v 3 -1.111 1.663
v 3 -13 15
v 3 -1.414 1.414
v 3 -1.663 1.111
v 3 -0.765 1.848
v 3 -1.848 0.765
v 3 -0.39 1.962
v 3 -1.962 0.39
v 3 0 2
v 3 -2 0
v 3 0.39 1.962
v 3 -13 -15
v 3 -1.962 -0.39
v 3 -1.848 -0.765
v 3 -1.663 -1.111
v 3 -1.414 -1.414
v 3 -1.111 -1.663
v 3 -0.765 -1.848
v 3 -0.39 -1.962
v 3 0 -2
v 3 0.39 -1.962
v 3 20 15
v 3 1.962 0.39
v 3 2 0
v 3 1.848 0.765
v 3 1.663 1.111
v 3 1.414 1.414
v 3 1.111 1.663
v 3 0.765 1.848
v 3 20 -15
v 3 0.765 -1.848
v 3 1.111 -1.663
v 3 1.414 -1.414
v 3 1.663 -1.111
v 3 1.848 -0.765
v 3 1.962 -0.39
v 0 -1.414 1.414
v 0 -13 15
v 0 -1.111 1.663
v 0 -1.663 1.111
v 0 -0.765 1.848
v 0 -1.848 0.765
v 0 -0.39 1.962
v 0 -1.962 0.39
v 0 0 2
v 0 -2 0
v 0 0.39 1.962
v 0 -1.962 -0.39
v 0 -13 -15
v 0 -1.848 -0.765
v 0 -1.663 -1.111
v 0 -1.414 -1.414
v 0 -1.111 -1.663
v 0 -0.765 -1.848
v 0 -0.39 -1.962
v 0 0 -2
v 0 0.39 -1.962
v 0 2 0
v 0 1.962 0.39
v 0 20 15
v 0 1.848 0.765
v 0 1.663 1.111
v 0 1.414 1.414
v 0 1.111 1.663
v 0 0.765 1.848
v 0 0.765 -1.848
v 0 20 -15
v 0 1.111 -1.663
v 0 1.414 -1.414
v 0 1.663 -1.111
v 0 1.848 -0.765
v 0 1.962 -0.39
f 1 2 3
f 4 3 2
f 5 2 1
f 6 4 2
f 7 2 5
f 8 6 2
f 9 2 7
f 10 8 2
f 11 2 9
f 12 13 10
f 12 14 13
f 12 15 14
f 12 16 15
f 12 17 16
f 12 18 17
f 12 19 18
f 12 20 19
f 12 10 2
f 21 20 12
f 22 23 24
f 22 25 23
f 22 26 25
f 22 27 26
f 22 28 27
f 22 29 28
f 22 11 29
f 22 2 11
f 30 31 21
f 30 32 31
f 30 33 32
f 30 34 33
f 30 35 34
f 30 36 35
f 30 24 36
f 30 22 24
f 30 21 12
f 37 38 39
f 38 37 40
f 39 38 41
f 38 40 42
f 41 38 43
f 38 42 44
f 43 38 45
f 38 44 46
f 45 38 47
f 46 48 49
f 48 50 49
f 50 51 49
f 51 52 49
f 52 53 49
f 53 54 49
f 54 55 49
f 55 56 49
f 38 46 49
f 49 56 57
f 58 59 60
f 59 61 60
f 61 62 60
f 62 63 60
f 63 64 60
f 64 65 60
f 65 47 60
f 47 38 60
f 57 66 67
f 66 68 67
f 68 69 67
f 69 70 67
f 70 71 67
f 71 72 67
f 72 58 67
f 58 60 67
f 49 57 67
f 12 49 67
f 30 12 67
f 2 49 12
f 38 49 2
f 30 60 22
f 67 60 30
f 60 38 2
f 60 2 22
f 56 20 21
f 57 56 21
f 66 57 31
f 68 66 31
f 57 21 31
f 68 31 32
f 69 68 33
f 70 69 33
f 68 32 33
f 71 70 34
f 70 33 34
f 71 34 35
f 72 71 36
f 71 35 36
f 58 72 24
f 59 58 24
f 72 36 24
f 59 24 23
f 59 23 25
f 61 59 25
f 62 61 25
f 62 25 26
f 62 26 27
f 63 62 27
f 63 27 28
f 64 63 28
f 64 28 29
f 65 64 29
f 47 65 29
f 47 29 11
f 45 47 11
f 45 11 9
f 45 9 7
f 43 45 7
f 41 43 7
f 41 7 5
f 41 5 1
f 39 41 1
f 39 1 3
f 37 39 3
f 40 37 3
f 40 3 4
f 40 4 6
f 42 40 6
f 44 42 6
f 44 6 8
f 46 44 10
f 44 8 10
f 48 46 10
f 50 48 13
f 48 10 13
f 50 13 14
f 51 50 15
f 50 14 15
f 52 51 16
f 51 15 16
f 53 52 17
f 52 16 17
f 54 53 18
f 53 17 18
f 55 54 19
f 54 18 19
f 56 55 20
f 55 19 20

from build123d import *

# Parameters (mm, degrees)
SKETCH_1_W          = 30
SKETCH_1_H          = 40
EXTRUDE_1_DEPTH     = 3
SKETCH_2_R          = 2
CUT_EXTRUDE_1_DEPTH = 4
SKETCH_3_W          = 30
SKETCH_3_H          = 7
CUT_EXTRUDE_2_DEPTH = 4


with BuildPart() as part:
    # 草图1 → 凸台-拉伸1 (new body)
    with BuildSketch(Plane(origin=(0, 0, 0), x_dir=(0, 0, -1), z_dir=(1, 0, 0))):
        Rectangle(SKETCH_1_W, SKETCH_1_H)
    extrude(amount=EXTRUDE_1_DEPTH)

    # 草图2 → 切除-拉伸1 (cut, through all)
    with BuildSketch(Plane(origin=(3, 0, 0), x_dir=(0, 0, -1), z_dir=(1, 0, 0))):
        Circle(SKETCH_2_R)
    extrude(amount=-CUT_EXTRUDE_1_DEPTH, mode=Mode.SUBTRACT)

    # 草图3 → 切除-拉伸2 (cut, through all)
    with BuildSketch(Plane.ZY):
        with Locations((0, -16.5)):
            Rectangle(SKETCH_3_W, SKETCH_3_H)
    extrude(amount=-CUT_EXTRUDE_2_DEPTH, mode=Mode.SUBTRACT)


solid = part.part
